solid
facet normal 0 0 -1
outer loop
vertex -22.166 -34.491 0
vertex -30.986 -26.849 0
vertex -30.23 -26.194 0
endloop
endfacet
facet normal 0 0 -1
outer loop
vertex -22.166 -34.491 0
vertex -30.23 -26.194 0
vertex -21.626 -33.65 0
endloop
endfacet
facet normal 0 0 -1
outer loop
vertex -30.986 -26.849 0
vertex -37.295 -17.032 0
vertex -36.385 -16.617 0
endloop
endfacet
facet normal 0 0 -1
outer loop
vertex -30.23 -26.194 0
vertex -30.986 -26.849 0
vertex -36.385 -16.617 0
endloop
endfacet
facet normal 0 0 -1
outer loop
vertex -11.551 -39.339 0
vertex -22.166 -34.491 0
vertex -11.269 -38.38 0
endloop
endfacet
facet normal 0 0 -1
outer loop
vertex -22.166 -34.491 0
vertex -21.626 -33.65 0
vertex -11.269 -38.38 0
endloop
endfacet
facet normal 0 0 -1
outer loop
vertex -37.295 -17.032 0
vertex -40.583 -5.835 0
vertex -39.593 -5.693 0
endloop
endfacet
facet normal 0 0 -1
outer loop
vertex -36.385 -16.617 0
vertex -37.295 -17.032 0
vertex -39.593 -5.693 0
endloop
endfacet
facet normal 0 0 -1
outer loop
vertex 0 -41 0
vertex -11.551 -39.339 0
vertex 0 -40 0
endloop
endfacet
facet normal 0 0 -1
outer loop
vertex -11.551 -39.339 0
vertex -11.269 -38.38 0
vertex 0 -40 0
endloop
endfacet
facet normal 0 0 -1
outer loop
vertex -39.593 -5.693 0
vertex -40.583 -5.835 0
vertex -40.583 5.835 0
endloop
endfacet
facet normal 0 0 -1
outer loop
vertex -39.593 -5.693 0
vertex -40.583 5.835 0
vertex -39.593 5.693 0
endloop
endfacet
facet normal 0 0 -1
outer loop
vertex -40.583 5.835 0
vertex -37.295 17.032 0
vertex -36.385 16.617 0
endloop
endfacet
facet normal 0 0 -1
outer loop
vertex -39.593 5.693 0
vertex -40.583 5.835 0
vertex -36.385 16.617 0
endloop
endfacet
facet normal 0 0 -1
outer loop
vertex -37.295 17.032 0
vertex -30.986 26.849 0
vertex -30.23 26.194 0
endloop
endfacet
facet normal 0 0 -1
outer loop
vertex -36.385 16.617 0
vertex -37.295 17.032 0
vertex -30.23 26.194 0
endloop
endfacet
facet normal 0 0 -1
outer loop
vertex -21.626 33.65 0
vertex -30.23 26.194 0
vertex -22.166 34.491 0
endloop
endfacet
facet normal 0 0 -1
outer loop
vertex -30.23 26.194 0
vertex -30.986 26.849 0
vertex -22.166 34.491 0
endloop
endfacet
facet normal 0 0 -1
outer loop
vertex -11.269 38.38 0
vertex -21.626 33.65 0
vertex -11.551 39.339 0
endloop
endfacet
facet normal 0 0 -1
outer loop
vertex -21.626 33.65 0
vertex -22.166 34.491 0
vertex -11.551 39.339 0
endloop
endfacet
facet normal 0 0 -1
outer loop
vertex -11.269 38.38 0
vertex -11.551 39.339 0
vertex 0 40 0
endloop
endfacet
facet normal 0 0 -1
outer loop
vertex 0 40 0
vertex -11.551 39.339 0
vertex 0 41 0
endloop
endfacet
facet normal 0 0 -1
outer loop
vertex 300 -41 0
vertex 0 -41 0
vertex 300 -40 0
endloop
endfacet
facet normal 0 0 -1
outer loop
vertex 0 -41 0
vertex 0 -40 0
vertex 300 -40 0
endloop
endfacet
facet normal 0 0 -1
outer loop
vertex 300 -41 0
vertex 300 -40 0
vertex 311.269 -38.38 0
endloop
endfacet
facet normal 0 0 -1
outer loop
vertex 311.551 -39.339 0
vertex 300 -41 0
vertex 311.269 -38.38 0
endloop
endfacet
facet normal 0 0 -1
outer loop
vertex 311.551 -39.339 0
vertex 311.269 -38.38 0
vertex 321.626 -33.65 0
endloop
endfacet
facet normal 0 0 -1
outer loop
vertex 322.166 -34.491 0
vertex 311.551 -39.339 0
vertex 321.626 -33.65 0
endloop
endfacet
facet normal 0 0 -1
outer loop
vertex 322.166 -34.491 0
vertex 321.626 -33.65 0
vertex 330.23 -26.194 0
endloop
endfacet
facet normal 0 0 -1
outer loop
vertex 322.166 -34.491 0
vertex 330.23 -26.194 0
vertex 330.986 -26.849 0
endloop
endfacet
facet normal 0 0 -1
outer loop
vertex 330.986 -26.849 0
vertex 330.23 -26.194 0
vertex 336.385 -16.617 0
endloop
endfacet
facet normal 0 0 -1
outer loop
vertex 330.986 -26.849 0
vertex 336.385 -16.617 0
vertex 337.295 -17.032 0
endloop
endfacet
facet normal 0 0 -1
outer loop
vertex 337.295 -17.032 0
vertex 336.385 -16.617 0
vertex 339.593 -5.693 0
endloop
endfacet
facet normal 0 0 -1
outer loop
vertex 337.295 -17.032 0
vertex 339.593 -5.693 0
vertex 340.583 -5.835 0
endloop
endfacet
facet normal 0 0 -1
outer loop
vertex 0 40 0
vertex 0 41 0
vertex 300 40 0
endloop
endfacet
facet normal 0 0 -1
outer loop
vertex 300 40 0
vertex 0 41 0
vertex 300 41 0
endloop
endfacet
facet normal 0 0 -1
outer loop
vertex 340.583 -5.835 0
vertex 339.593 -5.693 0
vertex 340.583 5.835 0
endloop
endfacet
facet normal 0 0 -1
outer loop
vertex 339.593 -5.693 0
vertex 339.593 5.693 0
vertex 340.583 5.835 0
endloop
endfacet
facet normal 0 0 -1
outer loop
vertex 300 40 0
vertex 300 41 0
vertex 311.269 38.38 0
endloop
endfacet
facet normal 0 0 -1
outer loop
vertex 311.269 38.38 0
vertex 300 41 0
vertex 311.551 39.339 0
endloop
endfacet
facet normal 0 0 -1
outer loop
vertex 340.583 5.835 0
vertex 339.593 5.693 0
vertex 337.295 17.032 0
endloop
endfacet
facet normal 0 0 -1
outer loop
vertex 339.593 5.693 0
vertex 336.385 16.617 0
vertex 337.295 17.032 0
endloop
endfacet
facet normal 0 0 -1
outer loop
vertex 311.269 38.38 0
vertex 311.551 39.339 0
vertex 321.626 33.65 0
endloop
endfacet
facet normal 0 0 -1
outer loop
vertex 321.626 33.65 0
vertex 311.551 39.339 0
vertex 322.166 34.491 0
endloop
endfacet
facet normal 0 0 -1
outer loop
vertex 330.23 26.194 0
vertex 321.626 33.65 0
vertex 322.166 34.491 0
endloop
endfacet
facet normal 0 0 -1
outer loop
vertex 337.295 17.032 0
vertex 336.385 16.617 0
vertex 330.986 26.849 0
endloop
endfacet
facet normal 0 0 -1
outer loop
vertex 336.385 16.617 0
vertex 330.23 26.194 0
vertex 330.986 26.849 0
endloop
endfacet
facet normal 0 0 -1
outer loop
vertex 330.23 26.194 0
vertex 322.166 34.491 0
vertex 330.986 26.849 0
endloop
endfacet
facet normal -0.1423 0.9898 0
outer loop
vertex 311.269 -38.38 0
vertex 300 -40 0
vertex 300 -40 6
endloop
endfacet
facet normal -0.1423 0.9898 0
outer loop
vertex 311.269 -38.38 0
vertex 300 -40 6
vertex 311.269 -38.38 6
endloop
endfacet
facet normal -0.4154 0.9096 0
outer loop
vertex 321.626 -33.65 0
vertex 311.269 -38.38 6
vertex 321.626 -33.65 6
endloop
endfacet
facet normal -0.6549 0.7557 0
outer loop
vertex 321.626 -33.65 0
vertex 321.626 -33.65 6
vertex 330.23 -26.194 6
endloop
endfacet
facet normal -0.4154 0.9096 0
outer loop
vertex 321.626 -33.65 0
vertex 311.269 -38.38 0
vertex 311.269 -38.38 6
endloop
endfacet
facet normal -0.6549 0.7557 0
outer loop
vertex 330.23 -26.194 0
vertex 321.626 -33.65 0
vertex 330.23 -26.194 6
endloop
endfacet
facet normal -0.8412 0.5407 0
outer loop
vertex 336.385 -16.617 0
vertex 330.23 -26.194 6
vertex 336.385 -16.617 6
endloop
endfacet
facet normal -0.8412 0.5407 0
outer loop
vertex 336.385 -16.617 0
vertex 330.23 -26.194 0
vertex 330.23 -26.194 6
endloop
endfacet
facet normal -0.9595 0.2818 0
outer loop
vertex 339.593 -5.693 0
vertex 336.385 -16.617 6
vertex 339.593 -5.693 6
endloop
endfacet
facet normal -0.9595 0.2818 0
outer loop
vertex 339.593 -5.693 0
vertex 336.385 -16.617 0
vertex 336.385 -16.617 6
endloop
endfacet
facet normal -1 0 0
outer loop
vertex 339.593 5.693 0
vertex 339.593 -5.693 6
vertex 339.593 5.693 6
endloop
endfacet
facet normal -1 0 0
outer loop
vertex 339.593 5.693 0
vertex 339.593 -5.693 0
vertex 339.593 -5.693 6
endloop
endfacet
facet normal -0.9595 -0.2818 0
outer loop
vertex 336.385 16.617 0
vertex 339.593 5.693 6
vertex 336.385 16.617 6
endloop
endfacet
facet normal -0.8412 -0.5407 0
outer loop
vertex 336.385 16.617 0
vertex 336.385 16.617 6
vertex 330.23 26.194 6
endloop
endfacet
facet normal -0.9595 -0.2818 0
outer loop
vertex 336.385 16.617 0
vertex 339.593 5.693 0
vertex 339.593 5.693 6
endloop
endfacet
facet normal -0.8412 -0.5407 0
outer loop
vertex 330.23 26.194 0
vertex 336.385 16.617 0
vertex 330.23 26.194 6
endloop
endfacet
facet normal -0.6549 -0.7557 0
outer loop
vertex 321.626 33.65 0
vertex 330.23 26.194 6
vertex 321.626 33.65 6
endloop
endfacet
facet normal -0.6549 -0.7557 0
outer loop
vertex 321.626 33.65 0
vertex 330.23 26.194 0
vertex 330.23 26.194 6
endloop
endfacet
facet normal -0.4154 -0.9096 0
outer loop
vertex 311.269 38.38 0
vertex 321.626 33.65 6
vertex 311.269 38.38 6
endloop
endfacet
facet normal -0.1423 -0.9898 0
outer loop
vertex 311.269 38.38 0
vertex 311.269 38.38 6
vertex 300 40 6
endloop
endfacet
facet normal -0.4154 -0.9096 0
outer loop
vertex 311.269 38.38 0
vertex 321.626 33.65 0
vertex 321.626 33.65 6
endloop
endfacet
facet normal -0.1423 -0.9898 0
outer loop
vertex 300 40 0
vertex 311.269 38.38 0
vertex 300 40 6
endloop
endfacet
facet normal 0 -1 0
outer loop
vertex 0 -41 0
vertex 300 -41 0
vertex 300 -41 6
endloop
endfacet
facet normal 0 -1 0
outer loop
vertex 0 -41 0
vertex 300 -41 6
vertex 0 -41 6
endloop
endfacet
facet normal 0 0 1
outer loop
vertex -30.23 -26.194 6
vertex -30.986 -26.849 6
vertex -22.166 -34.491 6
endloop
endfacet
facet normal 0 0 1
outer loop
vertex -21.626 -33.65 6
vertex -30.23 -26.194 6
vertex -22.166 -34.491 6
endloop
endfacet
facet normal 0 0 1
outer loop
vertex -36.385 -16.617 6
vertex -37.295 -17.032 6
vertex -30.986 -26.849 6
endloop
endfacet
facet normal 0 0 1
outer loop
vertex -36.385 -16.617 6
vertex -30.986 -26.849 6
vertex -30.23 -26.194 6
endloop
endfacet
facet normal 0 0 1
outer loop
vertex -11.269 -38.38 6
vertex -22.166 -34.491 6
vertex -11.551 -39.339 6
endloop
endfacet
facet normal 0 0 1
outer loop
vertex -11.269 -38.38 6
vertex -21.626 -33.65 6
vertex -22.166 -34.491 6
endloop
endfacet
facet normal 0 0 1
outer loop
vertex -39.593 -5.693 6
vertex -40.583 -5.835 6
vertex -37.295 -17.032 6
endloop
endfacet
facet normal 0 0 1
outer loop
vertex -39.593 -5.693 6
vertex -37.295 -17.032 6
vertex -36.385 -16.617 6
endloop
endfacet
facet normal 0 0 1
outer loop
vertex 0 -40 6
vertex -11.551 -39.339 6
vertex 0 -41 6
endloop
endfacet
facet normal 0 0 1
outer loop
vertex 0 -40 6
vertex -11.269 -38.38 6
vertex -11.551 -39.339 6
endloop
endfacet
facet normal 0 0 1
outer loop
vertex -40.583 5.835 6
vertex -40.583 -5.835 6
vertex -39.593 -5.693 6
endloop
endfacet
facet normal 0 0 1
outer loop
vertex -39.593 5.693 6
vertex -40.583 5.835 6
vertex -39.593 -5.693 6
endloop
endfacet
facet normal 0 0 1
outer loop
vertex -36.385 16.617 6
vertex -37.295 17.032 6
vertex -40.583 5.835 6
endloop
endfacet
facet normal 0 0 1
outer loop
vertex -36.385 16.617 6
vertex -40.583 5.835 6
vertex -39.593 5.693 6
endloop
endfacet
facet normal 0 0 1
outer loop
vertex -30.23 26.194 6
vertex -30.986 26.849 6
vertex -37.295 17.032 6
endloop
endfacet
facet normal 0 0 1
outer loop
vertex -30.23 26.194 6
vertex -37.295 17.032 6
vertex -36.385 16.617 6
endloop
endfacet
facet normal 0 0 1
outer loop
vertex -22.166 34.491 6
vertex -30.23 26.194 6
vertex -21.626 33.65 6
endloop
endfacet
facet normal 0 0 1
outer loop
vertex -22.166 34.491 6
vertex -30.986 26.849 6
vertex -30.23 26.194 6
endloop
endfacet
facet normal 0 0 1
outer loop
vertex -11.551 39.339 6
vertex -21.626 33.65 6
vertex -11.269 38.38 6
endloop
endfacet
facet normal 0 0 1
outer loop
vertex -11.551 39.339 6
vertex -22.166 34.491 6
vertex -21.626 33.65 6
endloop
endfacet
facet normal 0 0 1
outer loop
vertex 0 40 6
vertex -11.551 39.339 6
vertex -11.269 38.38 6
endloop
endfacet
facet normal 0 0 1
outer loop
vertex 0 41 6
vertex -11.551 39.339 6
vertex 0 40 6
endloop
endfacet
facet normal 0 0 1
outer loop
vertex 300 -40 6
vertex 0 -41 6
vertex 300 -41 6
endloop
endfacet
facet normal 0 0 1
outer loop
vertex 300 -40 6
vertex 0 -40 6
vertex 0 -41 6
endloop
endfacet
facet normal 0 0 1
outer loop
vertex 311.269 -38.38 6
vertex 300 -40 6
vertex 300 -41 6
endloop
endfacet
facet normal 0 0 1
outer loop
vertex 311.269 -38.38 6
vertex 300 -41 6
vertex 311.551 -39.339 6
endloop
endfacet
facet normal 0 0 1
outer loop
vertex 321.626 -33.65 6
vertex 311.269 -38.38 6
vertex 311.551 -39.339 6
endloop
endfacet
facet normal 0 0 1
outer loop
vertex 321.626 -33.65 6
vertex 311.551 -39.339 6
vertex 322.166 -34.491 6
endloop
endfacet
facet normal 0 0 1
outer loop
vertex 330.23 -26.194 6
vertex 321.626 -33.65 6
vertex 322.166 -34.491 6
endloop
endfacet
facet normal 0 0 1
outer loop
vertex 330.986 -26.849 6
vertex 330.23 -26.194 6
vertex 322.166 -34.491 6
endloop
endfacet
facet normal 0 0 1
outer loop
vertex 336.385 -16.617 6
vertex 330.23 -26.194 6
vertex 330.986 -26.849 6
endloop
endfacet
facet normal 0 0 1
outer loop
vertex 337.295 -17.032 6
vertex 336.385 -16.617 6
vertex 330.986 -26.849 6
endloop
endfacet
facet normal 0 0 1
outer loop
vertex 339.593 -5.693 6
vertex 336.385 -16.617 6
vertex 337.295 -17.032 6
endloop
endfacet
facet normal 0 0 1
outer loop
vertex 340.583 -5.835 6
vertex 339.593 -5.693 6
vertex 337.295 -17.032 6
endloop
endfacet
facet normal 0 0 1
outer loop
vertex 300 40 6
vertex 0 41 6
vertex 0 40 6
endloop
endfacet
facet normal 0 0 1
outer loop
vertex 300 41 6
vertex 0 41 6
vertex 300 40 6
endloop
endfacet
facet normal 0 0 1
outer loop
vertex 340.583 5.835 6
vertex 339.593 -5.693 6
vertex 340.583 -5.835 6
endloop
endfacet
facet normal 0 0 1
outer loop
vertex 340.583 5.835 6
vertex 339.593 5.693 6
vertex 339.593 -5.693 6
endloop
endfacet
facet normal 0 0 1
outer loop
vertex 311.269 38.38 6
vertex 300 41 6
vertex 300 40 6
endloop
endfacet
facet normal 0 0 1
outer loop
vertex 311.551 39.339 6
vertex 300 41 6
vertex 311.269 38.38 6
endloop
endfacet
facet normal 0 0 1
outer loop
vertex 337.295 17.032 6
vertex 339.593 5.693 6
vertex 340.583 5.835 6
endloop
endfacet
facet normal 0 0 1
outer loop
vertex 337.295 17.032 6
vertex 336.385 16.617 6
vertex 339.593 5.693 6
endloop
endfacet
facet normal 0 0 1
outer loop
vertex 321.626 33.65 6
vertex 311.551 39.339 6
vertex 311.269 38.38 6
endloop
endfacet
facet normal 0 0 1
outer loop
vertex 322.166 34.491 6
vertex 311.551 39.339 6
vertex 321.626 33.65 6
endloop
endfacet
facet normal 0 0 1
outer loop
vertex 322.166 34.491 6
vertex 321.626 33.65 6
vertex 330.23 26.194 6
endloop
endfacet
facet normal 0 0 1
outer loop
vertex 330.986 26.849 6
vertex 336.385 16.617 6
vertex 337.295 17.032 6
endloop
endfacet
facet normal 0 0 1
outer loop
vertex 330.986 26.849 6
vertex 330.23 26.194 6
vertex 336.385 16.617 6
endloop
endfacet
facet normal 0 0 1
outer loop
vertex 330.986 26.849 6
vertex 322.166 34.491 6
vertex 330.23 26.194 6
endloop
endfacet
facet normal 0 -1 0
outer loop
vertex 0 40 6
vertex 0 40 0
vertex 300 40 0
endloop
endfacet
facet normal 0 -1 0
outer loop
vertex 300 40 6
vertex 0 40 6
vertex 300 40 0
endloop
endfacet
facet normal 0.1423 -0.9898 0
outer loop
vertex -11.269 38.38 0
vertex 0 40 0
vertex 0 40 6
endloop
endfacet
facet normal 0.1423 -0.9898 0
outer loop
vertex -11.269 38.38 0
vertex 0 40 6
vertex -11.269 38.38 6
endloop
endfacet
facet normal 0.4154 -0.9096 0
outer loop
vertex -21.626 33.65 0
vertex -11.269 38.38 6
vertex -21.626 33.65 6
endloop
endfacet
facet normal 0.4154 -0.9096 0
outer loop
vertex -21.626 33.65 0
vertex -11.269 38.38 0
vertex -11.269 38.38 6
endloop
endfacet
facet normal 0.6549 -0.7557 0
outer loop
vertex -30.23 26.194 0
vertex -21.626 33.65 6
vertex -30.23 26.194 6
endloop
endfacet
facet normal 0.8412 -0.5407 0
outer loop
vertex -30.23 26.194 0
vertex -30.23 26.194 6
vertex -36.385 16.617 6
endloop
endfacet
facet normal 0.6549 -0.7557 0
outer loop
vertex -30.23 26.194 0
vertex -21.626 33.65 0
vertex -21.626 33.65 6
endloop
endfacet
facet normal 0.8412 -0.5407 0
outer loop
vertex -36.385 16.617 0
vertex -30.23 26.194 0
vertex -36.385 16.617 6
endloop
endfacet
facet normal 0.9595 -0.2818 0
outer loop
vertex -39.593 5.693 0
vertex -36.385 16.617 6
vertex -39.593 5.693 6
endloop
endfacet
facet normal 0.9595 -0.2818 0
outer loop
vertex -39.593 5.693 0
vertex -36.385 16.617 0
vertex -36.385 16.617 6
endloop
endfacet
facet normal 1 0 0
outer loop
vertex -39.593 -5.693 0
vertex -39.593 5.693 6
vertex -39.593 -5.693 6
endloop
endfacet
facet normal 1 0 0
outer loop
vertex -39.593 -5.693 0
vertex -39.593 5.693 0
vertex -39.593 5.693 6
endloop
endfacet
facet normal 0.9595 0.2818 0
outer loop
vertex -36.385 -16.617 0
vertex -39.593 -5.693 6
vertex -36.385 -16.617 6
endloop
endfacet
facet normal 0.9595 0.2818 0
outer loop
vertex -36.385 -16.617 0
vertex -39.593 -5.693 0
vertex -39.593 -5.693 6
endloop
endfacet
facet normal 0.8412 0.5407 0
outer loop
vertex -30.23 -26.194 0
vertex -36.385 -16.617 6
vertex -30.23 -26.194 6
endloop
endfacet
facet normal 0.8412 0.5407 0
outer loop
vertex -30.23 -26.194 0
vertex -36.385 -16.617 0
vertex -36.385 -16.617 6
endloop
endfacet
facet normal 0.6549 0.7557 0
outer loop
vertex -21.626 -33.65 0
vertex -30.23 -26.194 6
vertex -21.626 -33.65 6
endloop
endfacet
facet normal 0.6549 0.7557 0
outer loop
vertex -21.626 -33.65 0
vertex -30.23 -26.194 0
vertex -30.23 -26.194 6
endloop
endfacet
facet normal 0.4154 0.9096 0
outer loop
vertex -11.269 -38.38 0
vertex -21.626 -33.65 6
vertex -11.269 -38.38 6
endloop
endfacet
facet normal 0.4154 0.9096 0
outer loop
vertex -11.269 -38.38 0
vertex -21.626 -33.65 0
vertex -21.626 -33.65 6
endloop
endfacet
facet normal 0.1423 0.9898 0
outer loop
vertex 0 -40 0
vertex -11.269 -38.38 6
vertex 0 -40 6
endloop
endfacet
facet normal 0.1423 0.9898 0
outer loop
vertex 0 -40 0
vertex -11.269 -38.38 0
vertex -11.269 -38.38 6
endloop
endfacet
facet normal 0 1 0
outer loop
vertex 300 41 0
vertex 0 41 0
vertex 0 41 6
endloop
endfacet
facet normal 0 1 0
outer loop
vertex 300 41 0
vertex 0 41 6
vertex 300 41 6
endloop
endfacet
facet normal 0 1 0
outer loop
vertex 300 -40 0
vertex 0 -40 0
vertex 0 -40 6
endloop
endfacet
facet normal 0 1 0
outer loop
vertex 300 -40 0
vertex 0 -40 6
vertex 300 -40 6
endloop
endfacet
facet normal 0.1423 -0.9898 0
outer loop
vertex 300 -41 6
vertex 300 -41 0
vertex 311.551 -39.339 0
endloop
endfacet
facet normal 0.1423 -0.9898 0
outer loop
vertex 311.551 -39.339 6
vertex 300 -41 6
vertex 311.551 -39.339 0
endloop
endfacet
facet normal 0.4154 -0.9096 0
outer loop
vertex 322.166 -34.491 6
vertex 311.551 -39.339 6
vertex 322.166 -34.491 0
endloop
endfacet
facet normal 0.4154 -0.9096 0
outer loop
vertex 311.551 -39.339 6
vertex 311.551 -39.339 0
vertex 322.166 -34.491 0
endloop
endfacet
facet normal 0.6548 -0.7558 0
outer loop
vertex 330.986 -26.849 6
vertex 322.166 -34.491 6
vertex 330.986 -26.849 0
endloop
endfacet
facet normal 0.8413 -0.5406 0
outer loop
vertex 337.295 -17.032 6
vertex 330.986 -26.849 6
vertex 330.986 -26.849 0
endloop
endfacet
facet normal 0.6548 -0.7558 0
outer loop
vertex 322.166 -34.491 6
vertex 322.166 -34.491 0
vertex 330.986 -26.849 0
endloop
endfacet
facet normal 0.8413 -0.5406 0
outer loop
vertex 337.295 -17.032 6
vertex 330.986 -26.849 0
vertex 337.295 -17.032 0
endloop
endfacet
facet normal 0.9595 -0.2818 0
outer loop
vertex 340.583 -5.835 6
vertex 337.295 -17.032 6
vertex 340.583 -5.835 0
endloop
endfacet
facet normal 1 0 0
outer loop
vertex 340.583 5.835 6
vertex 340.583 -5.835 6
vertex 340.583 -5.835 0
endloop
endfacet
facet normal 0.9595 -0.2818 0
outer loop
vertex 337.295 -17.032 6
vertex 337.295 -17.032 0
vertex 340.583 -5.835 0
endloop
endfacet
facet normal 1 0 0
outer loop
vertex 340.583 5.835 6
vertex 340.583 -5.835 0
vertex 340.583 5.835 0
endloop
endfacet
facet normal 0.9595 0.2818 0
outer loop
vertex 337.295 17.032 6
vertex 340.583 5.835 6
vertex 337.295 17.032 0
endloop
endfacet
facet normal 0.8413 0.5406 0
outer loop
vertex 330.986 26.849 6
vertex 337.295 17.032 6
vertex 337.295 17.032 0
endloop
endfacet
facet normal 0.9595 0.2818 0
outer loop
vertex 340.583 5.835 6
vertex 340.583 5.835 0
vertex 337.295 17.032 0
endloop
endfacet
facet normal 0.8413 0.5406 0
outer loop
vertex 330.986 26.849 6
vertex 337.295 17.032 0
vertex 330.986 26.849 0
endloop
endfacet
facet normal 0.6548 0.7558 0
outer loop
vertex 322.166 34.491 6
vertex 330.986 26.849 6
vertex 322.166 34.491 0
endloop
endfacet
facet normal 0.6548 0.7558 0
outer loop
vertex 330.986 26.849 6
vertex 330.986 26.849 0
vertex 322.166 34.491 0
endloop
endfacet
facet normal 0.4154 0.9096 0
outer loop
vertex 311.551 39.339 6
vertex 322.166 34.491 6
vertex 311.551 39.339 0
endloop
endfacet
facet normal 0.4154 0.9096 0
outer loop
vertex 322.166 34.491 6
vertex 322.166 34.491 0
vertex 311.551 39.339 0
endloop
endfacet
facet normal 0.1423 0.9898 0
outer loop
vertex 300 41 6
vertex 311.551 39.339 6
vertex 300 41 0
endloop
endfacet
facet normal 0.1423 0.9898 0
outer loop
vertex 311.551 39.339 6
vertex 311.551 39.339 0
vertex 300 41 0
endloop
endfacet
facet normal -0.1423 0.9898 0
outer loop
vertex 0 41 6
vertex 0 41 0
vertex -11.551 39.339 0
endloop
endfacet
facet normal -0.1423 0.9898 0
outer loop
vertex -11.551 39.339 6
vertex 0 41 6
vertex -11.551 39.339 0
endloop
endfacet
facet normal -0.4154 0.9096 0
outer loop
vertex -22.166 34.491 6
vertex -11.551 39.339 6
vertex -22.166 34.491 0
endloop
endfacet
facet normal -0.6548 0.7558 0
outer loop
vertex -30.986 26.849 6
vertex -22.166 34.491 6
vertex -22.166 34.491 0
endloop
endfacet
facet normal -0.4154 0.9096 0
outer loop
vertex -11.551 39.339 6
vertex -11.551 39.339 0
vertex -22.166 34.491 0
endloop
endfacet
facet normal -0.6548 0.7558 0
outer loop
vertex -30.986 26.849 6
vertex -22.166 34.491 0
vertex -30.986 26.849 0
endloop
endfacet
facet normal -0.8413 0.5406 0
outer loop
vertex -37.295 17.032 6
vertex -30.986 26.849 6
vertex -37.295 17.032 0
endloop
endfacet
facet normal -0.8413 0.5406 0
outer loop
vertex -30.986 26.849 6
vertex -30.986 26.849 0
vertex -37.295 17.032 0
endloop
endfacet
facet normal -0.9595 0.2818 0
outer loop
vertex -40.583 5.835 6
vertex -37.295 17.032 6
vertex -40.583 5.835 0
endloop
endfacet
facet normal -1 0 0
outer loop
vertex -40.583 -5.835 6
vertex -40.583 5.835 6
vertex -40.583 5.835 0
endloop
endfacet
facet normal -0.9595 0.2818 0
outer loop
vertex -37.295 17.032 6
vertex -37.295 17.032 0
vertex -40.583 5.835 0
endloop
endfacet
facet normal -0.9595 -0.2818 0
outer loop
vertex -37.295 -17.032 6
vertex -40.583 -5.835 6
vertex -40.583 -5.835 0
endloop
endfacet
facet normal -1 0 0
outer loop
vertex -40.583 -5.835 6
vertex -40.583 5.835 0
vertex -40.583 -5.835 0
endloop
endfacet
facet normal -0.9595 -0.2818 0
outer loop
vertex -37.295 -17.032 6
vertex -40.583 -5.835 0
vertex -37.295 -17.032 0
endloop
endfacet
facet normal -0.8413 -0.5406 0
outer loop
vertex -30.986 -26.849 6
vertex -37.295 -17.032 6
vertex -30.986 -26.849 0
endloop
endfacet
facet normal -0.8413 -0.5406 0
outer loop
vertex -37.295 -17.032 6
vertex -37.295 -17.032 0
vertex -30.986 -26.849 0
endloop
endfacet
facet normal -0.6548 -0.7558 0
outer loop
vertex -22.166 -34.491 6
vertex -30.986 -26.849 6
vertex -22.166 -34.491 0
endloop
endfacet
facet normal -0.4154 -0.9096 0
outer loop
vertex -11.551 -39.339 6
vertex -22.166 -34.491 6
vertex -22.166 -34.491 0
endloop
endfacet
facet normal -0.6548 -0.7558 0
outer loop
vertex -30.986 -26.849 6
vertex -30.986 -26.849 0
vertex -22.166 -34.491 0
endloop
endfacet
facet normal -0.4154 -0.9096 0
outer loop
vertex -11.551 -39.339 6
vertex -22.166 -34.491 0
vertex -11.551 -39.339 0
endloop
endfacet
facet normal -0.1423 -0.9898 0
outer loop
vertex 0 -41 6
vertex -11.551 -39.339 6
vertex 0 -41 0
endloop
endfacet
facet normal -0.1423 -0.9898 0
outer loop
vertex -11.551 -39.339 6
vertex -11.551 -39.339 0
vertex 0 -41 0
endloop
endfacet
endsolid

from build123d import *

# Parameters (mm, degrees)
PAD_DEPTH = 6


with BuildPart() as part:
    # Sketch → Pad (new body)
    with BuildSketch(Plane.XY):
        with BuildLine():
            ThreePointArc((0, 41), (-41, 0), (0, -41))
            Line((300.000005, -41), (0, -41))
            ThreePointArc((300.000005, -41), (341, 0), (300.000005, 41))
            Line((0, 41), (300.000005, 41))
        make_face()
        with BuildLine():
            ThreePointArc((0, 40), (-40, 0), (0, -40))
            Line((0, -40), (300.000002, -40))
            ThreePointArc((300.000002, -40), (340, 0), (300.000001, 40))
            Line((0, 40), (300.000001, 40))
        make_face(mode=Mode.SUBTRACT)
    extrude(amount=PAD_DEPTH)


solid = part.part
